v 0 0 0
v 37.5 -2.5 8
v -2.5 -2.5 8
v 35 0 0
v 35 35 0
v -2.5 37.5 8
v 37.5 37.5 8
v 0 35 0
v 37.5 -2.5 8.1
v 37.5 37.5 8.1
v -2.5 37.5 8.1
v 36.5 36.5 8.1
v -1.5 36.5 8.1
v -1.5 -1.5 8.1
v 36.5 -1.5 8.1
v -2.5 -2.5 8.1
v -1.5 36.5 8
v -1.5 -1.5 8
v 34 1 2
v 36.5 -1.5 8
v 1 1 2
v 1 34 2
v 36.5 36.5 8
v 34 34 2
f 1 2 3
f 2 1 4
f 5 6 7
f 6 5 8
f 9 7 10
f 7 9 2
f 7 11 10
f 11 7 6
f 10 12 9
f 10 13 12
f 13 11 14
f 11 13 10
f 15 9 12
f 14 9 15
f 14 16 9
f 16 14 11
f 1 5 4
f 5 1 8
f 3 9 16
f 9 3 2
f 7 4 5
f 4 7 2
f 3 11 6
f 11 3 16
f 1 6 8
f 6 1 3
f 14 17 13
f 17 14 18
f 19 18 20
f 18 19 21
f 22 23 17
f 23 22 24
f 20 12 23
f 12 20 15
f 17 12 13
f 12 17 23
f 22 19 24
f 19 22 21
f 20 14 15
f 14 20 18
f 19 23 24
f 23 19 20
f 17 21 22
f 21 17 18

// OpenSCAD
// vim:ts=4:sw=4:sts=4:et:ai:fdm=marker
//
// Small tray made for mixing epoxy for smaller jobs. Print in any colour or filament, although
// some say it's wise to avoid PLA since epoxy gets hot, but then, you hardly use these again
// anyway.
//
// Written by Roy Sigurd Karlsbakk <roy@karlsbakk.net> in August 2025 with some good help
// from perplexity.ai to do the trapezoid stuff, which I didn't understand. It couldn't fix the
// rest, like making the bottom thicker and fixing the code.
//
// Licensed under Creative Commons BY-NC-SA v4.0 or later. Please see
// https://creativecommons.org/licenses/by-nc-sa/4.0/ for details.

// Parameters
wall_thickness = 1;
height = 8;
top_size = 40;
bottom_size = 35;
extra_bottom_thickness = 1;
bugfix = $preview ? .1 : 0;

// Outer shell with absolute coordinates (origin at bottom corner)
module trapezoid_shell(top_len, bottom_len, height) {
    hull() {
        // Bottom square at z = bottom_thickness (starting just above bottom plate)
        linear_extrude(0.1) {
            square([bottom_len, bottom_len]);
        }
        // Top square at z = height, properly aligned over bottom
        translate([(bottom_len - top_len)/2, (bottom_len - top_len)/2, height]) {
            linear_extrude(0.1) {
                square([top_len, top_len]);
            }
        }
    }
}

// Inner void to subtract (create hollow)
module inner_void(inner_top, inner_bottom) {
    hull() {
        translate([wall_thickness, wall_thickness, wall_thickness+extra_bottom_thickness]) {
            linear_extrude(0.1) {
                square([inner_bottom, inner_bottom]);
            }
        }
        translate([(inner_bottom - inner_top)/2 + wall_thickness, (inner_bottom - inner_top)/2 + wall_thickness, height]) {
            linear_extrude(0.1) {
                square([inner_top, inner_top]);
            }
        }
    }
}

// Final shape
difference() {
    trapezoid_shell(top_size, bottom_size, height-bugfix);
    
    inner_top = top_size - 2 * wall_thickness;
    inner_bottom = bottom_size - 2 * wall_thickness;
    inner_void(inner_top, inner_bottom);
}
